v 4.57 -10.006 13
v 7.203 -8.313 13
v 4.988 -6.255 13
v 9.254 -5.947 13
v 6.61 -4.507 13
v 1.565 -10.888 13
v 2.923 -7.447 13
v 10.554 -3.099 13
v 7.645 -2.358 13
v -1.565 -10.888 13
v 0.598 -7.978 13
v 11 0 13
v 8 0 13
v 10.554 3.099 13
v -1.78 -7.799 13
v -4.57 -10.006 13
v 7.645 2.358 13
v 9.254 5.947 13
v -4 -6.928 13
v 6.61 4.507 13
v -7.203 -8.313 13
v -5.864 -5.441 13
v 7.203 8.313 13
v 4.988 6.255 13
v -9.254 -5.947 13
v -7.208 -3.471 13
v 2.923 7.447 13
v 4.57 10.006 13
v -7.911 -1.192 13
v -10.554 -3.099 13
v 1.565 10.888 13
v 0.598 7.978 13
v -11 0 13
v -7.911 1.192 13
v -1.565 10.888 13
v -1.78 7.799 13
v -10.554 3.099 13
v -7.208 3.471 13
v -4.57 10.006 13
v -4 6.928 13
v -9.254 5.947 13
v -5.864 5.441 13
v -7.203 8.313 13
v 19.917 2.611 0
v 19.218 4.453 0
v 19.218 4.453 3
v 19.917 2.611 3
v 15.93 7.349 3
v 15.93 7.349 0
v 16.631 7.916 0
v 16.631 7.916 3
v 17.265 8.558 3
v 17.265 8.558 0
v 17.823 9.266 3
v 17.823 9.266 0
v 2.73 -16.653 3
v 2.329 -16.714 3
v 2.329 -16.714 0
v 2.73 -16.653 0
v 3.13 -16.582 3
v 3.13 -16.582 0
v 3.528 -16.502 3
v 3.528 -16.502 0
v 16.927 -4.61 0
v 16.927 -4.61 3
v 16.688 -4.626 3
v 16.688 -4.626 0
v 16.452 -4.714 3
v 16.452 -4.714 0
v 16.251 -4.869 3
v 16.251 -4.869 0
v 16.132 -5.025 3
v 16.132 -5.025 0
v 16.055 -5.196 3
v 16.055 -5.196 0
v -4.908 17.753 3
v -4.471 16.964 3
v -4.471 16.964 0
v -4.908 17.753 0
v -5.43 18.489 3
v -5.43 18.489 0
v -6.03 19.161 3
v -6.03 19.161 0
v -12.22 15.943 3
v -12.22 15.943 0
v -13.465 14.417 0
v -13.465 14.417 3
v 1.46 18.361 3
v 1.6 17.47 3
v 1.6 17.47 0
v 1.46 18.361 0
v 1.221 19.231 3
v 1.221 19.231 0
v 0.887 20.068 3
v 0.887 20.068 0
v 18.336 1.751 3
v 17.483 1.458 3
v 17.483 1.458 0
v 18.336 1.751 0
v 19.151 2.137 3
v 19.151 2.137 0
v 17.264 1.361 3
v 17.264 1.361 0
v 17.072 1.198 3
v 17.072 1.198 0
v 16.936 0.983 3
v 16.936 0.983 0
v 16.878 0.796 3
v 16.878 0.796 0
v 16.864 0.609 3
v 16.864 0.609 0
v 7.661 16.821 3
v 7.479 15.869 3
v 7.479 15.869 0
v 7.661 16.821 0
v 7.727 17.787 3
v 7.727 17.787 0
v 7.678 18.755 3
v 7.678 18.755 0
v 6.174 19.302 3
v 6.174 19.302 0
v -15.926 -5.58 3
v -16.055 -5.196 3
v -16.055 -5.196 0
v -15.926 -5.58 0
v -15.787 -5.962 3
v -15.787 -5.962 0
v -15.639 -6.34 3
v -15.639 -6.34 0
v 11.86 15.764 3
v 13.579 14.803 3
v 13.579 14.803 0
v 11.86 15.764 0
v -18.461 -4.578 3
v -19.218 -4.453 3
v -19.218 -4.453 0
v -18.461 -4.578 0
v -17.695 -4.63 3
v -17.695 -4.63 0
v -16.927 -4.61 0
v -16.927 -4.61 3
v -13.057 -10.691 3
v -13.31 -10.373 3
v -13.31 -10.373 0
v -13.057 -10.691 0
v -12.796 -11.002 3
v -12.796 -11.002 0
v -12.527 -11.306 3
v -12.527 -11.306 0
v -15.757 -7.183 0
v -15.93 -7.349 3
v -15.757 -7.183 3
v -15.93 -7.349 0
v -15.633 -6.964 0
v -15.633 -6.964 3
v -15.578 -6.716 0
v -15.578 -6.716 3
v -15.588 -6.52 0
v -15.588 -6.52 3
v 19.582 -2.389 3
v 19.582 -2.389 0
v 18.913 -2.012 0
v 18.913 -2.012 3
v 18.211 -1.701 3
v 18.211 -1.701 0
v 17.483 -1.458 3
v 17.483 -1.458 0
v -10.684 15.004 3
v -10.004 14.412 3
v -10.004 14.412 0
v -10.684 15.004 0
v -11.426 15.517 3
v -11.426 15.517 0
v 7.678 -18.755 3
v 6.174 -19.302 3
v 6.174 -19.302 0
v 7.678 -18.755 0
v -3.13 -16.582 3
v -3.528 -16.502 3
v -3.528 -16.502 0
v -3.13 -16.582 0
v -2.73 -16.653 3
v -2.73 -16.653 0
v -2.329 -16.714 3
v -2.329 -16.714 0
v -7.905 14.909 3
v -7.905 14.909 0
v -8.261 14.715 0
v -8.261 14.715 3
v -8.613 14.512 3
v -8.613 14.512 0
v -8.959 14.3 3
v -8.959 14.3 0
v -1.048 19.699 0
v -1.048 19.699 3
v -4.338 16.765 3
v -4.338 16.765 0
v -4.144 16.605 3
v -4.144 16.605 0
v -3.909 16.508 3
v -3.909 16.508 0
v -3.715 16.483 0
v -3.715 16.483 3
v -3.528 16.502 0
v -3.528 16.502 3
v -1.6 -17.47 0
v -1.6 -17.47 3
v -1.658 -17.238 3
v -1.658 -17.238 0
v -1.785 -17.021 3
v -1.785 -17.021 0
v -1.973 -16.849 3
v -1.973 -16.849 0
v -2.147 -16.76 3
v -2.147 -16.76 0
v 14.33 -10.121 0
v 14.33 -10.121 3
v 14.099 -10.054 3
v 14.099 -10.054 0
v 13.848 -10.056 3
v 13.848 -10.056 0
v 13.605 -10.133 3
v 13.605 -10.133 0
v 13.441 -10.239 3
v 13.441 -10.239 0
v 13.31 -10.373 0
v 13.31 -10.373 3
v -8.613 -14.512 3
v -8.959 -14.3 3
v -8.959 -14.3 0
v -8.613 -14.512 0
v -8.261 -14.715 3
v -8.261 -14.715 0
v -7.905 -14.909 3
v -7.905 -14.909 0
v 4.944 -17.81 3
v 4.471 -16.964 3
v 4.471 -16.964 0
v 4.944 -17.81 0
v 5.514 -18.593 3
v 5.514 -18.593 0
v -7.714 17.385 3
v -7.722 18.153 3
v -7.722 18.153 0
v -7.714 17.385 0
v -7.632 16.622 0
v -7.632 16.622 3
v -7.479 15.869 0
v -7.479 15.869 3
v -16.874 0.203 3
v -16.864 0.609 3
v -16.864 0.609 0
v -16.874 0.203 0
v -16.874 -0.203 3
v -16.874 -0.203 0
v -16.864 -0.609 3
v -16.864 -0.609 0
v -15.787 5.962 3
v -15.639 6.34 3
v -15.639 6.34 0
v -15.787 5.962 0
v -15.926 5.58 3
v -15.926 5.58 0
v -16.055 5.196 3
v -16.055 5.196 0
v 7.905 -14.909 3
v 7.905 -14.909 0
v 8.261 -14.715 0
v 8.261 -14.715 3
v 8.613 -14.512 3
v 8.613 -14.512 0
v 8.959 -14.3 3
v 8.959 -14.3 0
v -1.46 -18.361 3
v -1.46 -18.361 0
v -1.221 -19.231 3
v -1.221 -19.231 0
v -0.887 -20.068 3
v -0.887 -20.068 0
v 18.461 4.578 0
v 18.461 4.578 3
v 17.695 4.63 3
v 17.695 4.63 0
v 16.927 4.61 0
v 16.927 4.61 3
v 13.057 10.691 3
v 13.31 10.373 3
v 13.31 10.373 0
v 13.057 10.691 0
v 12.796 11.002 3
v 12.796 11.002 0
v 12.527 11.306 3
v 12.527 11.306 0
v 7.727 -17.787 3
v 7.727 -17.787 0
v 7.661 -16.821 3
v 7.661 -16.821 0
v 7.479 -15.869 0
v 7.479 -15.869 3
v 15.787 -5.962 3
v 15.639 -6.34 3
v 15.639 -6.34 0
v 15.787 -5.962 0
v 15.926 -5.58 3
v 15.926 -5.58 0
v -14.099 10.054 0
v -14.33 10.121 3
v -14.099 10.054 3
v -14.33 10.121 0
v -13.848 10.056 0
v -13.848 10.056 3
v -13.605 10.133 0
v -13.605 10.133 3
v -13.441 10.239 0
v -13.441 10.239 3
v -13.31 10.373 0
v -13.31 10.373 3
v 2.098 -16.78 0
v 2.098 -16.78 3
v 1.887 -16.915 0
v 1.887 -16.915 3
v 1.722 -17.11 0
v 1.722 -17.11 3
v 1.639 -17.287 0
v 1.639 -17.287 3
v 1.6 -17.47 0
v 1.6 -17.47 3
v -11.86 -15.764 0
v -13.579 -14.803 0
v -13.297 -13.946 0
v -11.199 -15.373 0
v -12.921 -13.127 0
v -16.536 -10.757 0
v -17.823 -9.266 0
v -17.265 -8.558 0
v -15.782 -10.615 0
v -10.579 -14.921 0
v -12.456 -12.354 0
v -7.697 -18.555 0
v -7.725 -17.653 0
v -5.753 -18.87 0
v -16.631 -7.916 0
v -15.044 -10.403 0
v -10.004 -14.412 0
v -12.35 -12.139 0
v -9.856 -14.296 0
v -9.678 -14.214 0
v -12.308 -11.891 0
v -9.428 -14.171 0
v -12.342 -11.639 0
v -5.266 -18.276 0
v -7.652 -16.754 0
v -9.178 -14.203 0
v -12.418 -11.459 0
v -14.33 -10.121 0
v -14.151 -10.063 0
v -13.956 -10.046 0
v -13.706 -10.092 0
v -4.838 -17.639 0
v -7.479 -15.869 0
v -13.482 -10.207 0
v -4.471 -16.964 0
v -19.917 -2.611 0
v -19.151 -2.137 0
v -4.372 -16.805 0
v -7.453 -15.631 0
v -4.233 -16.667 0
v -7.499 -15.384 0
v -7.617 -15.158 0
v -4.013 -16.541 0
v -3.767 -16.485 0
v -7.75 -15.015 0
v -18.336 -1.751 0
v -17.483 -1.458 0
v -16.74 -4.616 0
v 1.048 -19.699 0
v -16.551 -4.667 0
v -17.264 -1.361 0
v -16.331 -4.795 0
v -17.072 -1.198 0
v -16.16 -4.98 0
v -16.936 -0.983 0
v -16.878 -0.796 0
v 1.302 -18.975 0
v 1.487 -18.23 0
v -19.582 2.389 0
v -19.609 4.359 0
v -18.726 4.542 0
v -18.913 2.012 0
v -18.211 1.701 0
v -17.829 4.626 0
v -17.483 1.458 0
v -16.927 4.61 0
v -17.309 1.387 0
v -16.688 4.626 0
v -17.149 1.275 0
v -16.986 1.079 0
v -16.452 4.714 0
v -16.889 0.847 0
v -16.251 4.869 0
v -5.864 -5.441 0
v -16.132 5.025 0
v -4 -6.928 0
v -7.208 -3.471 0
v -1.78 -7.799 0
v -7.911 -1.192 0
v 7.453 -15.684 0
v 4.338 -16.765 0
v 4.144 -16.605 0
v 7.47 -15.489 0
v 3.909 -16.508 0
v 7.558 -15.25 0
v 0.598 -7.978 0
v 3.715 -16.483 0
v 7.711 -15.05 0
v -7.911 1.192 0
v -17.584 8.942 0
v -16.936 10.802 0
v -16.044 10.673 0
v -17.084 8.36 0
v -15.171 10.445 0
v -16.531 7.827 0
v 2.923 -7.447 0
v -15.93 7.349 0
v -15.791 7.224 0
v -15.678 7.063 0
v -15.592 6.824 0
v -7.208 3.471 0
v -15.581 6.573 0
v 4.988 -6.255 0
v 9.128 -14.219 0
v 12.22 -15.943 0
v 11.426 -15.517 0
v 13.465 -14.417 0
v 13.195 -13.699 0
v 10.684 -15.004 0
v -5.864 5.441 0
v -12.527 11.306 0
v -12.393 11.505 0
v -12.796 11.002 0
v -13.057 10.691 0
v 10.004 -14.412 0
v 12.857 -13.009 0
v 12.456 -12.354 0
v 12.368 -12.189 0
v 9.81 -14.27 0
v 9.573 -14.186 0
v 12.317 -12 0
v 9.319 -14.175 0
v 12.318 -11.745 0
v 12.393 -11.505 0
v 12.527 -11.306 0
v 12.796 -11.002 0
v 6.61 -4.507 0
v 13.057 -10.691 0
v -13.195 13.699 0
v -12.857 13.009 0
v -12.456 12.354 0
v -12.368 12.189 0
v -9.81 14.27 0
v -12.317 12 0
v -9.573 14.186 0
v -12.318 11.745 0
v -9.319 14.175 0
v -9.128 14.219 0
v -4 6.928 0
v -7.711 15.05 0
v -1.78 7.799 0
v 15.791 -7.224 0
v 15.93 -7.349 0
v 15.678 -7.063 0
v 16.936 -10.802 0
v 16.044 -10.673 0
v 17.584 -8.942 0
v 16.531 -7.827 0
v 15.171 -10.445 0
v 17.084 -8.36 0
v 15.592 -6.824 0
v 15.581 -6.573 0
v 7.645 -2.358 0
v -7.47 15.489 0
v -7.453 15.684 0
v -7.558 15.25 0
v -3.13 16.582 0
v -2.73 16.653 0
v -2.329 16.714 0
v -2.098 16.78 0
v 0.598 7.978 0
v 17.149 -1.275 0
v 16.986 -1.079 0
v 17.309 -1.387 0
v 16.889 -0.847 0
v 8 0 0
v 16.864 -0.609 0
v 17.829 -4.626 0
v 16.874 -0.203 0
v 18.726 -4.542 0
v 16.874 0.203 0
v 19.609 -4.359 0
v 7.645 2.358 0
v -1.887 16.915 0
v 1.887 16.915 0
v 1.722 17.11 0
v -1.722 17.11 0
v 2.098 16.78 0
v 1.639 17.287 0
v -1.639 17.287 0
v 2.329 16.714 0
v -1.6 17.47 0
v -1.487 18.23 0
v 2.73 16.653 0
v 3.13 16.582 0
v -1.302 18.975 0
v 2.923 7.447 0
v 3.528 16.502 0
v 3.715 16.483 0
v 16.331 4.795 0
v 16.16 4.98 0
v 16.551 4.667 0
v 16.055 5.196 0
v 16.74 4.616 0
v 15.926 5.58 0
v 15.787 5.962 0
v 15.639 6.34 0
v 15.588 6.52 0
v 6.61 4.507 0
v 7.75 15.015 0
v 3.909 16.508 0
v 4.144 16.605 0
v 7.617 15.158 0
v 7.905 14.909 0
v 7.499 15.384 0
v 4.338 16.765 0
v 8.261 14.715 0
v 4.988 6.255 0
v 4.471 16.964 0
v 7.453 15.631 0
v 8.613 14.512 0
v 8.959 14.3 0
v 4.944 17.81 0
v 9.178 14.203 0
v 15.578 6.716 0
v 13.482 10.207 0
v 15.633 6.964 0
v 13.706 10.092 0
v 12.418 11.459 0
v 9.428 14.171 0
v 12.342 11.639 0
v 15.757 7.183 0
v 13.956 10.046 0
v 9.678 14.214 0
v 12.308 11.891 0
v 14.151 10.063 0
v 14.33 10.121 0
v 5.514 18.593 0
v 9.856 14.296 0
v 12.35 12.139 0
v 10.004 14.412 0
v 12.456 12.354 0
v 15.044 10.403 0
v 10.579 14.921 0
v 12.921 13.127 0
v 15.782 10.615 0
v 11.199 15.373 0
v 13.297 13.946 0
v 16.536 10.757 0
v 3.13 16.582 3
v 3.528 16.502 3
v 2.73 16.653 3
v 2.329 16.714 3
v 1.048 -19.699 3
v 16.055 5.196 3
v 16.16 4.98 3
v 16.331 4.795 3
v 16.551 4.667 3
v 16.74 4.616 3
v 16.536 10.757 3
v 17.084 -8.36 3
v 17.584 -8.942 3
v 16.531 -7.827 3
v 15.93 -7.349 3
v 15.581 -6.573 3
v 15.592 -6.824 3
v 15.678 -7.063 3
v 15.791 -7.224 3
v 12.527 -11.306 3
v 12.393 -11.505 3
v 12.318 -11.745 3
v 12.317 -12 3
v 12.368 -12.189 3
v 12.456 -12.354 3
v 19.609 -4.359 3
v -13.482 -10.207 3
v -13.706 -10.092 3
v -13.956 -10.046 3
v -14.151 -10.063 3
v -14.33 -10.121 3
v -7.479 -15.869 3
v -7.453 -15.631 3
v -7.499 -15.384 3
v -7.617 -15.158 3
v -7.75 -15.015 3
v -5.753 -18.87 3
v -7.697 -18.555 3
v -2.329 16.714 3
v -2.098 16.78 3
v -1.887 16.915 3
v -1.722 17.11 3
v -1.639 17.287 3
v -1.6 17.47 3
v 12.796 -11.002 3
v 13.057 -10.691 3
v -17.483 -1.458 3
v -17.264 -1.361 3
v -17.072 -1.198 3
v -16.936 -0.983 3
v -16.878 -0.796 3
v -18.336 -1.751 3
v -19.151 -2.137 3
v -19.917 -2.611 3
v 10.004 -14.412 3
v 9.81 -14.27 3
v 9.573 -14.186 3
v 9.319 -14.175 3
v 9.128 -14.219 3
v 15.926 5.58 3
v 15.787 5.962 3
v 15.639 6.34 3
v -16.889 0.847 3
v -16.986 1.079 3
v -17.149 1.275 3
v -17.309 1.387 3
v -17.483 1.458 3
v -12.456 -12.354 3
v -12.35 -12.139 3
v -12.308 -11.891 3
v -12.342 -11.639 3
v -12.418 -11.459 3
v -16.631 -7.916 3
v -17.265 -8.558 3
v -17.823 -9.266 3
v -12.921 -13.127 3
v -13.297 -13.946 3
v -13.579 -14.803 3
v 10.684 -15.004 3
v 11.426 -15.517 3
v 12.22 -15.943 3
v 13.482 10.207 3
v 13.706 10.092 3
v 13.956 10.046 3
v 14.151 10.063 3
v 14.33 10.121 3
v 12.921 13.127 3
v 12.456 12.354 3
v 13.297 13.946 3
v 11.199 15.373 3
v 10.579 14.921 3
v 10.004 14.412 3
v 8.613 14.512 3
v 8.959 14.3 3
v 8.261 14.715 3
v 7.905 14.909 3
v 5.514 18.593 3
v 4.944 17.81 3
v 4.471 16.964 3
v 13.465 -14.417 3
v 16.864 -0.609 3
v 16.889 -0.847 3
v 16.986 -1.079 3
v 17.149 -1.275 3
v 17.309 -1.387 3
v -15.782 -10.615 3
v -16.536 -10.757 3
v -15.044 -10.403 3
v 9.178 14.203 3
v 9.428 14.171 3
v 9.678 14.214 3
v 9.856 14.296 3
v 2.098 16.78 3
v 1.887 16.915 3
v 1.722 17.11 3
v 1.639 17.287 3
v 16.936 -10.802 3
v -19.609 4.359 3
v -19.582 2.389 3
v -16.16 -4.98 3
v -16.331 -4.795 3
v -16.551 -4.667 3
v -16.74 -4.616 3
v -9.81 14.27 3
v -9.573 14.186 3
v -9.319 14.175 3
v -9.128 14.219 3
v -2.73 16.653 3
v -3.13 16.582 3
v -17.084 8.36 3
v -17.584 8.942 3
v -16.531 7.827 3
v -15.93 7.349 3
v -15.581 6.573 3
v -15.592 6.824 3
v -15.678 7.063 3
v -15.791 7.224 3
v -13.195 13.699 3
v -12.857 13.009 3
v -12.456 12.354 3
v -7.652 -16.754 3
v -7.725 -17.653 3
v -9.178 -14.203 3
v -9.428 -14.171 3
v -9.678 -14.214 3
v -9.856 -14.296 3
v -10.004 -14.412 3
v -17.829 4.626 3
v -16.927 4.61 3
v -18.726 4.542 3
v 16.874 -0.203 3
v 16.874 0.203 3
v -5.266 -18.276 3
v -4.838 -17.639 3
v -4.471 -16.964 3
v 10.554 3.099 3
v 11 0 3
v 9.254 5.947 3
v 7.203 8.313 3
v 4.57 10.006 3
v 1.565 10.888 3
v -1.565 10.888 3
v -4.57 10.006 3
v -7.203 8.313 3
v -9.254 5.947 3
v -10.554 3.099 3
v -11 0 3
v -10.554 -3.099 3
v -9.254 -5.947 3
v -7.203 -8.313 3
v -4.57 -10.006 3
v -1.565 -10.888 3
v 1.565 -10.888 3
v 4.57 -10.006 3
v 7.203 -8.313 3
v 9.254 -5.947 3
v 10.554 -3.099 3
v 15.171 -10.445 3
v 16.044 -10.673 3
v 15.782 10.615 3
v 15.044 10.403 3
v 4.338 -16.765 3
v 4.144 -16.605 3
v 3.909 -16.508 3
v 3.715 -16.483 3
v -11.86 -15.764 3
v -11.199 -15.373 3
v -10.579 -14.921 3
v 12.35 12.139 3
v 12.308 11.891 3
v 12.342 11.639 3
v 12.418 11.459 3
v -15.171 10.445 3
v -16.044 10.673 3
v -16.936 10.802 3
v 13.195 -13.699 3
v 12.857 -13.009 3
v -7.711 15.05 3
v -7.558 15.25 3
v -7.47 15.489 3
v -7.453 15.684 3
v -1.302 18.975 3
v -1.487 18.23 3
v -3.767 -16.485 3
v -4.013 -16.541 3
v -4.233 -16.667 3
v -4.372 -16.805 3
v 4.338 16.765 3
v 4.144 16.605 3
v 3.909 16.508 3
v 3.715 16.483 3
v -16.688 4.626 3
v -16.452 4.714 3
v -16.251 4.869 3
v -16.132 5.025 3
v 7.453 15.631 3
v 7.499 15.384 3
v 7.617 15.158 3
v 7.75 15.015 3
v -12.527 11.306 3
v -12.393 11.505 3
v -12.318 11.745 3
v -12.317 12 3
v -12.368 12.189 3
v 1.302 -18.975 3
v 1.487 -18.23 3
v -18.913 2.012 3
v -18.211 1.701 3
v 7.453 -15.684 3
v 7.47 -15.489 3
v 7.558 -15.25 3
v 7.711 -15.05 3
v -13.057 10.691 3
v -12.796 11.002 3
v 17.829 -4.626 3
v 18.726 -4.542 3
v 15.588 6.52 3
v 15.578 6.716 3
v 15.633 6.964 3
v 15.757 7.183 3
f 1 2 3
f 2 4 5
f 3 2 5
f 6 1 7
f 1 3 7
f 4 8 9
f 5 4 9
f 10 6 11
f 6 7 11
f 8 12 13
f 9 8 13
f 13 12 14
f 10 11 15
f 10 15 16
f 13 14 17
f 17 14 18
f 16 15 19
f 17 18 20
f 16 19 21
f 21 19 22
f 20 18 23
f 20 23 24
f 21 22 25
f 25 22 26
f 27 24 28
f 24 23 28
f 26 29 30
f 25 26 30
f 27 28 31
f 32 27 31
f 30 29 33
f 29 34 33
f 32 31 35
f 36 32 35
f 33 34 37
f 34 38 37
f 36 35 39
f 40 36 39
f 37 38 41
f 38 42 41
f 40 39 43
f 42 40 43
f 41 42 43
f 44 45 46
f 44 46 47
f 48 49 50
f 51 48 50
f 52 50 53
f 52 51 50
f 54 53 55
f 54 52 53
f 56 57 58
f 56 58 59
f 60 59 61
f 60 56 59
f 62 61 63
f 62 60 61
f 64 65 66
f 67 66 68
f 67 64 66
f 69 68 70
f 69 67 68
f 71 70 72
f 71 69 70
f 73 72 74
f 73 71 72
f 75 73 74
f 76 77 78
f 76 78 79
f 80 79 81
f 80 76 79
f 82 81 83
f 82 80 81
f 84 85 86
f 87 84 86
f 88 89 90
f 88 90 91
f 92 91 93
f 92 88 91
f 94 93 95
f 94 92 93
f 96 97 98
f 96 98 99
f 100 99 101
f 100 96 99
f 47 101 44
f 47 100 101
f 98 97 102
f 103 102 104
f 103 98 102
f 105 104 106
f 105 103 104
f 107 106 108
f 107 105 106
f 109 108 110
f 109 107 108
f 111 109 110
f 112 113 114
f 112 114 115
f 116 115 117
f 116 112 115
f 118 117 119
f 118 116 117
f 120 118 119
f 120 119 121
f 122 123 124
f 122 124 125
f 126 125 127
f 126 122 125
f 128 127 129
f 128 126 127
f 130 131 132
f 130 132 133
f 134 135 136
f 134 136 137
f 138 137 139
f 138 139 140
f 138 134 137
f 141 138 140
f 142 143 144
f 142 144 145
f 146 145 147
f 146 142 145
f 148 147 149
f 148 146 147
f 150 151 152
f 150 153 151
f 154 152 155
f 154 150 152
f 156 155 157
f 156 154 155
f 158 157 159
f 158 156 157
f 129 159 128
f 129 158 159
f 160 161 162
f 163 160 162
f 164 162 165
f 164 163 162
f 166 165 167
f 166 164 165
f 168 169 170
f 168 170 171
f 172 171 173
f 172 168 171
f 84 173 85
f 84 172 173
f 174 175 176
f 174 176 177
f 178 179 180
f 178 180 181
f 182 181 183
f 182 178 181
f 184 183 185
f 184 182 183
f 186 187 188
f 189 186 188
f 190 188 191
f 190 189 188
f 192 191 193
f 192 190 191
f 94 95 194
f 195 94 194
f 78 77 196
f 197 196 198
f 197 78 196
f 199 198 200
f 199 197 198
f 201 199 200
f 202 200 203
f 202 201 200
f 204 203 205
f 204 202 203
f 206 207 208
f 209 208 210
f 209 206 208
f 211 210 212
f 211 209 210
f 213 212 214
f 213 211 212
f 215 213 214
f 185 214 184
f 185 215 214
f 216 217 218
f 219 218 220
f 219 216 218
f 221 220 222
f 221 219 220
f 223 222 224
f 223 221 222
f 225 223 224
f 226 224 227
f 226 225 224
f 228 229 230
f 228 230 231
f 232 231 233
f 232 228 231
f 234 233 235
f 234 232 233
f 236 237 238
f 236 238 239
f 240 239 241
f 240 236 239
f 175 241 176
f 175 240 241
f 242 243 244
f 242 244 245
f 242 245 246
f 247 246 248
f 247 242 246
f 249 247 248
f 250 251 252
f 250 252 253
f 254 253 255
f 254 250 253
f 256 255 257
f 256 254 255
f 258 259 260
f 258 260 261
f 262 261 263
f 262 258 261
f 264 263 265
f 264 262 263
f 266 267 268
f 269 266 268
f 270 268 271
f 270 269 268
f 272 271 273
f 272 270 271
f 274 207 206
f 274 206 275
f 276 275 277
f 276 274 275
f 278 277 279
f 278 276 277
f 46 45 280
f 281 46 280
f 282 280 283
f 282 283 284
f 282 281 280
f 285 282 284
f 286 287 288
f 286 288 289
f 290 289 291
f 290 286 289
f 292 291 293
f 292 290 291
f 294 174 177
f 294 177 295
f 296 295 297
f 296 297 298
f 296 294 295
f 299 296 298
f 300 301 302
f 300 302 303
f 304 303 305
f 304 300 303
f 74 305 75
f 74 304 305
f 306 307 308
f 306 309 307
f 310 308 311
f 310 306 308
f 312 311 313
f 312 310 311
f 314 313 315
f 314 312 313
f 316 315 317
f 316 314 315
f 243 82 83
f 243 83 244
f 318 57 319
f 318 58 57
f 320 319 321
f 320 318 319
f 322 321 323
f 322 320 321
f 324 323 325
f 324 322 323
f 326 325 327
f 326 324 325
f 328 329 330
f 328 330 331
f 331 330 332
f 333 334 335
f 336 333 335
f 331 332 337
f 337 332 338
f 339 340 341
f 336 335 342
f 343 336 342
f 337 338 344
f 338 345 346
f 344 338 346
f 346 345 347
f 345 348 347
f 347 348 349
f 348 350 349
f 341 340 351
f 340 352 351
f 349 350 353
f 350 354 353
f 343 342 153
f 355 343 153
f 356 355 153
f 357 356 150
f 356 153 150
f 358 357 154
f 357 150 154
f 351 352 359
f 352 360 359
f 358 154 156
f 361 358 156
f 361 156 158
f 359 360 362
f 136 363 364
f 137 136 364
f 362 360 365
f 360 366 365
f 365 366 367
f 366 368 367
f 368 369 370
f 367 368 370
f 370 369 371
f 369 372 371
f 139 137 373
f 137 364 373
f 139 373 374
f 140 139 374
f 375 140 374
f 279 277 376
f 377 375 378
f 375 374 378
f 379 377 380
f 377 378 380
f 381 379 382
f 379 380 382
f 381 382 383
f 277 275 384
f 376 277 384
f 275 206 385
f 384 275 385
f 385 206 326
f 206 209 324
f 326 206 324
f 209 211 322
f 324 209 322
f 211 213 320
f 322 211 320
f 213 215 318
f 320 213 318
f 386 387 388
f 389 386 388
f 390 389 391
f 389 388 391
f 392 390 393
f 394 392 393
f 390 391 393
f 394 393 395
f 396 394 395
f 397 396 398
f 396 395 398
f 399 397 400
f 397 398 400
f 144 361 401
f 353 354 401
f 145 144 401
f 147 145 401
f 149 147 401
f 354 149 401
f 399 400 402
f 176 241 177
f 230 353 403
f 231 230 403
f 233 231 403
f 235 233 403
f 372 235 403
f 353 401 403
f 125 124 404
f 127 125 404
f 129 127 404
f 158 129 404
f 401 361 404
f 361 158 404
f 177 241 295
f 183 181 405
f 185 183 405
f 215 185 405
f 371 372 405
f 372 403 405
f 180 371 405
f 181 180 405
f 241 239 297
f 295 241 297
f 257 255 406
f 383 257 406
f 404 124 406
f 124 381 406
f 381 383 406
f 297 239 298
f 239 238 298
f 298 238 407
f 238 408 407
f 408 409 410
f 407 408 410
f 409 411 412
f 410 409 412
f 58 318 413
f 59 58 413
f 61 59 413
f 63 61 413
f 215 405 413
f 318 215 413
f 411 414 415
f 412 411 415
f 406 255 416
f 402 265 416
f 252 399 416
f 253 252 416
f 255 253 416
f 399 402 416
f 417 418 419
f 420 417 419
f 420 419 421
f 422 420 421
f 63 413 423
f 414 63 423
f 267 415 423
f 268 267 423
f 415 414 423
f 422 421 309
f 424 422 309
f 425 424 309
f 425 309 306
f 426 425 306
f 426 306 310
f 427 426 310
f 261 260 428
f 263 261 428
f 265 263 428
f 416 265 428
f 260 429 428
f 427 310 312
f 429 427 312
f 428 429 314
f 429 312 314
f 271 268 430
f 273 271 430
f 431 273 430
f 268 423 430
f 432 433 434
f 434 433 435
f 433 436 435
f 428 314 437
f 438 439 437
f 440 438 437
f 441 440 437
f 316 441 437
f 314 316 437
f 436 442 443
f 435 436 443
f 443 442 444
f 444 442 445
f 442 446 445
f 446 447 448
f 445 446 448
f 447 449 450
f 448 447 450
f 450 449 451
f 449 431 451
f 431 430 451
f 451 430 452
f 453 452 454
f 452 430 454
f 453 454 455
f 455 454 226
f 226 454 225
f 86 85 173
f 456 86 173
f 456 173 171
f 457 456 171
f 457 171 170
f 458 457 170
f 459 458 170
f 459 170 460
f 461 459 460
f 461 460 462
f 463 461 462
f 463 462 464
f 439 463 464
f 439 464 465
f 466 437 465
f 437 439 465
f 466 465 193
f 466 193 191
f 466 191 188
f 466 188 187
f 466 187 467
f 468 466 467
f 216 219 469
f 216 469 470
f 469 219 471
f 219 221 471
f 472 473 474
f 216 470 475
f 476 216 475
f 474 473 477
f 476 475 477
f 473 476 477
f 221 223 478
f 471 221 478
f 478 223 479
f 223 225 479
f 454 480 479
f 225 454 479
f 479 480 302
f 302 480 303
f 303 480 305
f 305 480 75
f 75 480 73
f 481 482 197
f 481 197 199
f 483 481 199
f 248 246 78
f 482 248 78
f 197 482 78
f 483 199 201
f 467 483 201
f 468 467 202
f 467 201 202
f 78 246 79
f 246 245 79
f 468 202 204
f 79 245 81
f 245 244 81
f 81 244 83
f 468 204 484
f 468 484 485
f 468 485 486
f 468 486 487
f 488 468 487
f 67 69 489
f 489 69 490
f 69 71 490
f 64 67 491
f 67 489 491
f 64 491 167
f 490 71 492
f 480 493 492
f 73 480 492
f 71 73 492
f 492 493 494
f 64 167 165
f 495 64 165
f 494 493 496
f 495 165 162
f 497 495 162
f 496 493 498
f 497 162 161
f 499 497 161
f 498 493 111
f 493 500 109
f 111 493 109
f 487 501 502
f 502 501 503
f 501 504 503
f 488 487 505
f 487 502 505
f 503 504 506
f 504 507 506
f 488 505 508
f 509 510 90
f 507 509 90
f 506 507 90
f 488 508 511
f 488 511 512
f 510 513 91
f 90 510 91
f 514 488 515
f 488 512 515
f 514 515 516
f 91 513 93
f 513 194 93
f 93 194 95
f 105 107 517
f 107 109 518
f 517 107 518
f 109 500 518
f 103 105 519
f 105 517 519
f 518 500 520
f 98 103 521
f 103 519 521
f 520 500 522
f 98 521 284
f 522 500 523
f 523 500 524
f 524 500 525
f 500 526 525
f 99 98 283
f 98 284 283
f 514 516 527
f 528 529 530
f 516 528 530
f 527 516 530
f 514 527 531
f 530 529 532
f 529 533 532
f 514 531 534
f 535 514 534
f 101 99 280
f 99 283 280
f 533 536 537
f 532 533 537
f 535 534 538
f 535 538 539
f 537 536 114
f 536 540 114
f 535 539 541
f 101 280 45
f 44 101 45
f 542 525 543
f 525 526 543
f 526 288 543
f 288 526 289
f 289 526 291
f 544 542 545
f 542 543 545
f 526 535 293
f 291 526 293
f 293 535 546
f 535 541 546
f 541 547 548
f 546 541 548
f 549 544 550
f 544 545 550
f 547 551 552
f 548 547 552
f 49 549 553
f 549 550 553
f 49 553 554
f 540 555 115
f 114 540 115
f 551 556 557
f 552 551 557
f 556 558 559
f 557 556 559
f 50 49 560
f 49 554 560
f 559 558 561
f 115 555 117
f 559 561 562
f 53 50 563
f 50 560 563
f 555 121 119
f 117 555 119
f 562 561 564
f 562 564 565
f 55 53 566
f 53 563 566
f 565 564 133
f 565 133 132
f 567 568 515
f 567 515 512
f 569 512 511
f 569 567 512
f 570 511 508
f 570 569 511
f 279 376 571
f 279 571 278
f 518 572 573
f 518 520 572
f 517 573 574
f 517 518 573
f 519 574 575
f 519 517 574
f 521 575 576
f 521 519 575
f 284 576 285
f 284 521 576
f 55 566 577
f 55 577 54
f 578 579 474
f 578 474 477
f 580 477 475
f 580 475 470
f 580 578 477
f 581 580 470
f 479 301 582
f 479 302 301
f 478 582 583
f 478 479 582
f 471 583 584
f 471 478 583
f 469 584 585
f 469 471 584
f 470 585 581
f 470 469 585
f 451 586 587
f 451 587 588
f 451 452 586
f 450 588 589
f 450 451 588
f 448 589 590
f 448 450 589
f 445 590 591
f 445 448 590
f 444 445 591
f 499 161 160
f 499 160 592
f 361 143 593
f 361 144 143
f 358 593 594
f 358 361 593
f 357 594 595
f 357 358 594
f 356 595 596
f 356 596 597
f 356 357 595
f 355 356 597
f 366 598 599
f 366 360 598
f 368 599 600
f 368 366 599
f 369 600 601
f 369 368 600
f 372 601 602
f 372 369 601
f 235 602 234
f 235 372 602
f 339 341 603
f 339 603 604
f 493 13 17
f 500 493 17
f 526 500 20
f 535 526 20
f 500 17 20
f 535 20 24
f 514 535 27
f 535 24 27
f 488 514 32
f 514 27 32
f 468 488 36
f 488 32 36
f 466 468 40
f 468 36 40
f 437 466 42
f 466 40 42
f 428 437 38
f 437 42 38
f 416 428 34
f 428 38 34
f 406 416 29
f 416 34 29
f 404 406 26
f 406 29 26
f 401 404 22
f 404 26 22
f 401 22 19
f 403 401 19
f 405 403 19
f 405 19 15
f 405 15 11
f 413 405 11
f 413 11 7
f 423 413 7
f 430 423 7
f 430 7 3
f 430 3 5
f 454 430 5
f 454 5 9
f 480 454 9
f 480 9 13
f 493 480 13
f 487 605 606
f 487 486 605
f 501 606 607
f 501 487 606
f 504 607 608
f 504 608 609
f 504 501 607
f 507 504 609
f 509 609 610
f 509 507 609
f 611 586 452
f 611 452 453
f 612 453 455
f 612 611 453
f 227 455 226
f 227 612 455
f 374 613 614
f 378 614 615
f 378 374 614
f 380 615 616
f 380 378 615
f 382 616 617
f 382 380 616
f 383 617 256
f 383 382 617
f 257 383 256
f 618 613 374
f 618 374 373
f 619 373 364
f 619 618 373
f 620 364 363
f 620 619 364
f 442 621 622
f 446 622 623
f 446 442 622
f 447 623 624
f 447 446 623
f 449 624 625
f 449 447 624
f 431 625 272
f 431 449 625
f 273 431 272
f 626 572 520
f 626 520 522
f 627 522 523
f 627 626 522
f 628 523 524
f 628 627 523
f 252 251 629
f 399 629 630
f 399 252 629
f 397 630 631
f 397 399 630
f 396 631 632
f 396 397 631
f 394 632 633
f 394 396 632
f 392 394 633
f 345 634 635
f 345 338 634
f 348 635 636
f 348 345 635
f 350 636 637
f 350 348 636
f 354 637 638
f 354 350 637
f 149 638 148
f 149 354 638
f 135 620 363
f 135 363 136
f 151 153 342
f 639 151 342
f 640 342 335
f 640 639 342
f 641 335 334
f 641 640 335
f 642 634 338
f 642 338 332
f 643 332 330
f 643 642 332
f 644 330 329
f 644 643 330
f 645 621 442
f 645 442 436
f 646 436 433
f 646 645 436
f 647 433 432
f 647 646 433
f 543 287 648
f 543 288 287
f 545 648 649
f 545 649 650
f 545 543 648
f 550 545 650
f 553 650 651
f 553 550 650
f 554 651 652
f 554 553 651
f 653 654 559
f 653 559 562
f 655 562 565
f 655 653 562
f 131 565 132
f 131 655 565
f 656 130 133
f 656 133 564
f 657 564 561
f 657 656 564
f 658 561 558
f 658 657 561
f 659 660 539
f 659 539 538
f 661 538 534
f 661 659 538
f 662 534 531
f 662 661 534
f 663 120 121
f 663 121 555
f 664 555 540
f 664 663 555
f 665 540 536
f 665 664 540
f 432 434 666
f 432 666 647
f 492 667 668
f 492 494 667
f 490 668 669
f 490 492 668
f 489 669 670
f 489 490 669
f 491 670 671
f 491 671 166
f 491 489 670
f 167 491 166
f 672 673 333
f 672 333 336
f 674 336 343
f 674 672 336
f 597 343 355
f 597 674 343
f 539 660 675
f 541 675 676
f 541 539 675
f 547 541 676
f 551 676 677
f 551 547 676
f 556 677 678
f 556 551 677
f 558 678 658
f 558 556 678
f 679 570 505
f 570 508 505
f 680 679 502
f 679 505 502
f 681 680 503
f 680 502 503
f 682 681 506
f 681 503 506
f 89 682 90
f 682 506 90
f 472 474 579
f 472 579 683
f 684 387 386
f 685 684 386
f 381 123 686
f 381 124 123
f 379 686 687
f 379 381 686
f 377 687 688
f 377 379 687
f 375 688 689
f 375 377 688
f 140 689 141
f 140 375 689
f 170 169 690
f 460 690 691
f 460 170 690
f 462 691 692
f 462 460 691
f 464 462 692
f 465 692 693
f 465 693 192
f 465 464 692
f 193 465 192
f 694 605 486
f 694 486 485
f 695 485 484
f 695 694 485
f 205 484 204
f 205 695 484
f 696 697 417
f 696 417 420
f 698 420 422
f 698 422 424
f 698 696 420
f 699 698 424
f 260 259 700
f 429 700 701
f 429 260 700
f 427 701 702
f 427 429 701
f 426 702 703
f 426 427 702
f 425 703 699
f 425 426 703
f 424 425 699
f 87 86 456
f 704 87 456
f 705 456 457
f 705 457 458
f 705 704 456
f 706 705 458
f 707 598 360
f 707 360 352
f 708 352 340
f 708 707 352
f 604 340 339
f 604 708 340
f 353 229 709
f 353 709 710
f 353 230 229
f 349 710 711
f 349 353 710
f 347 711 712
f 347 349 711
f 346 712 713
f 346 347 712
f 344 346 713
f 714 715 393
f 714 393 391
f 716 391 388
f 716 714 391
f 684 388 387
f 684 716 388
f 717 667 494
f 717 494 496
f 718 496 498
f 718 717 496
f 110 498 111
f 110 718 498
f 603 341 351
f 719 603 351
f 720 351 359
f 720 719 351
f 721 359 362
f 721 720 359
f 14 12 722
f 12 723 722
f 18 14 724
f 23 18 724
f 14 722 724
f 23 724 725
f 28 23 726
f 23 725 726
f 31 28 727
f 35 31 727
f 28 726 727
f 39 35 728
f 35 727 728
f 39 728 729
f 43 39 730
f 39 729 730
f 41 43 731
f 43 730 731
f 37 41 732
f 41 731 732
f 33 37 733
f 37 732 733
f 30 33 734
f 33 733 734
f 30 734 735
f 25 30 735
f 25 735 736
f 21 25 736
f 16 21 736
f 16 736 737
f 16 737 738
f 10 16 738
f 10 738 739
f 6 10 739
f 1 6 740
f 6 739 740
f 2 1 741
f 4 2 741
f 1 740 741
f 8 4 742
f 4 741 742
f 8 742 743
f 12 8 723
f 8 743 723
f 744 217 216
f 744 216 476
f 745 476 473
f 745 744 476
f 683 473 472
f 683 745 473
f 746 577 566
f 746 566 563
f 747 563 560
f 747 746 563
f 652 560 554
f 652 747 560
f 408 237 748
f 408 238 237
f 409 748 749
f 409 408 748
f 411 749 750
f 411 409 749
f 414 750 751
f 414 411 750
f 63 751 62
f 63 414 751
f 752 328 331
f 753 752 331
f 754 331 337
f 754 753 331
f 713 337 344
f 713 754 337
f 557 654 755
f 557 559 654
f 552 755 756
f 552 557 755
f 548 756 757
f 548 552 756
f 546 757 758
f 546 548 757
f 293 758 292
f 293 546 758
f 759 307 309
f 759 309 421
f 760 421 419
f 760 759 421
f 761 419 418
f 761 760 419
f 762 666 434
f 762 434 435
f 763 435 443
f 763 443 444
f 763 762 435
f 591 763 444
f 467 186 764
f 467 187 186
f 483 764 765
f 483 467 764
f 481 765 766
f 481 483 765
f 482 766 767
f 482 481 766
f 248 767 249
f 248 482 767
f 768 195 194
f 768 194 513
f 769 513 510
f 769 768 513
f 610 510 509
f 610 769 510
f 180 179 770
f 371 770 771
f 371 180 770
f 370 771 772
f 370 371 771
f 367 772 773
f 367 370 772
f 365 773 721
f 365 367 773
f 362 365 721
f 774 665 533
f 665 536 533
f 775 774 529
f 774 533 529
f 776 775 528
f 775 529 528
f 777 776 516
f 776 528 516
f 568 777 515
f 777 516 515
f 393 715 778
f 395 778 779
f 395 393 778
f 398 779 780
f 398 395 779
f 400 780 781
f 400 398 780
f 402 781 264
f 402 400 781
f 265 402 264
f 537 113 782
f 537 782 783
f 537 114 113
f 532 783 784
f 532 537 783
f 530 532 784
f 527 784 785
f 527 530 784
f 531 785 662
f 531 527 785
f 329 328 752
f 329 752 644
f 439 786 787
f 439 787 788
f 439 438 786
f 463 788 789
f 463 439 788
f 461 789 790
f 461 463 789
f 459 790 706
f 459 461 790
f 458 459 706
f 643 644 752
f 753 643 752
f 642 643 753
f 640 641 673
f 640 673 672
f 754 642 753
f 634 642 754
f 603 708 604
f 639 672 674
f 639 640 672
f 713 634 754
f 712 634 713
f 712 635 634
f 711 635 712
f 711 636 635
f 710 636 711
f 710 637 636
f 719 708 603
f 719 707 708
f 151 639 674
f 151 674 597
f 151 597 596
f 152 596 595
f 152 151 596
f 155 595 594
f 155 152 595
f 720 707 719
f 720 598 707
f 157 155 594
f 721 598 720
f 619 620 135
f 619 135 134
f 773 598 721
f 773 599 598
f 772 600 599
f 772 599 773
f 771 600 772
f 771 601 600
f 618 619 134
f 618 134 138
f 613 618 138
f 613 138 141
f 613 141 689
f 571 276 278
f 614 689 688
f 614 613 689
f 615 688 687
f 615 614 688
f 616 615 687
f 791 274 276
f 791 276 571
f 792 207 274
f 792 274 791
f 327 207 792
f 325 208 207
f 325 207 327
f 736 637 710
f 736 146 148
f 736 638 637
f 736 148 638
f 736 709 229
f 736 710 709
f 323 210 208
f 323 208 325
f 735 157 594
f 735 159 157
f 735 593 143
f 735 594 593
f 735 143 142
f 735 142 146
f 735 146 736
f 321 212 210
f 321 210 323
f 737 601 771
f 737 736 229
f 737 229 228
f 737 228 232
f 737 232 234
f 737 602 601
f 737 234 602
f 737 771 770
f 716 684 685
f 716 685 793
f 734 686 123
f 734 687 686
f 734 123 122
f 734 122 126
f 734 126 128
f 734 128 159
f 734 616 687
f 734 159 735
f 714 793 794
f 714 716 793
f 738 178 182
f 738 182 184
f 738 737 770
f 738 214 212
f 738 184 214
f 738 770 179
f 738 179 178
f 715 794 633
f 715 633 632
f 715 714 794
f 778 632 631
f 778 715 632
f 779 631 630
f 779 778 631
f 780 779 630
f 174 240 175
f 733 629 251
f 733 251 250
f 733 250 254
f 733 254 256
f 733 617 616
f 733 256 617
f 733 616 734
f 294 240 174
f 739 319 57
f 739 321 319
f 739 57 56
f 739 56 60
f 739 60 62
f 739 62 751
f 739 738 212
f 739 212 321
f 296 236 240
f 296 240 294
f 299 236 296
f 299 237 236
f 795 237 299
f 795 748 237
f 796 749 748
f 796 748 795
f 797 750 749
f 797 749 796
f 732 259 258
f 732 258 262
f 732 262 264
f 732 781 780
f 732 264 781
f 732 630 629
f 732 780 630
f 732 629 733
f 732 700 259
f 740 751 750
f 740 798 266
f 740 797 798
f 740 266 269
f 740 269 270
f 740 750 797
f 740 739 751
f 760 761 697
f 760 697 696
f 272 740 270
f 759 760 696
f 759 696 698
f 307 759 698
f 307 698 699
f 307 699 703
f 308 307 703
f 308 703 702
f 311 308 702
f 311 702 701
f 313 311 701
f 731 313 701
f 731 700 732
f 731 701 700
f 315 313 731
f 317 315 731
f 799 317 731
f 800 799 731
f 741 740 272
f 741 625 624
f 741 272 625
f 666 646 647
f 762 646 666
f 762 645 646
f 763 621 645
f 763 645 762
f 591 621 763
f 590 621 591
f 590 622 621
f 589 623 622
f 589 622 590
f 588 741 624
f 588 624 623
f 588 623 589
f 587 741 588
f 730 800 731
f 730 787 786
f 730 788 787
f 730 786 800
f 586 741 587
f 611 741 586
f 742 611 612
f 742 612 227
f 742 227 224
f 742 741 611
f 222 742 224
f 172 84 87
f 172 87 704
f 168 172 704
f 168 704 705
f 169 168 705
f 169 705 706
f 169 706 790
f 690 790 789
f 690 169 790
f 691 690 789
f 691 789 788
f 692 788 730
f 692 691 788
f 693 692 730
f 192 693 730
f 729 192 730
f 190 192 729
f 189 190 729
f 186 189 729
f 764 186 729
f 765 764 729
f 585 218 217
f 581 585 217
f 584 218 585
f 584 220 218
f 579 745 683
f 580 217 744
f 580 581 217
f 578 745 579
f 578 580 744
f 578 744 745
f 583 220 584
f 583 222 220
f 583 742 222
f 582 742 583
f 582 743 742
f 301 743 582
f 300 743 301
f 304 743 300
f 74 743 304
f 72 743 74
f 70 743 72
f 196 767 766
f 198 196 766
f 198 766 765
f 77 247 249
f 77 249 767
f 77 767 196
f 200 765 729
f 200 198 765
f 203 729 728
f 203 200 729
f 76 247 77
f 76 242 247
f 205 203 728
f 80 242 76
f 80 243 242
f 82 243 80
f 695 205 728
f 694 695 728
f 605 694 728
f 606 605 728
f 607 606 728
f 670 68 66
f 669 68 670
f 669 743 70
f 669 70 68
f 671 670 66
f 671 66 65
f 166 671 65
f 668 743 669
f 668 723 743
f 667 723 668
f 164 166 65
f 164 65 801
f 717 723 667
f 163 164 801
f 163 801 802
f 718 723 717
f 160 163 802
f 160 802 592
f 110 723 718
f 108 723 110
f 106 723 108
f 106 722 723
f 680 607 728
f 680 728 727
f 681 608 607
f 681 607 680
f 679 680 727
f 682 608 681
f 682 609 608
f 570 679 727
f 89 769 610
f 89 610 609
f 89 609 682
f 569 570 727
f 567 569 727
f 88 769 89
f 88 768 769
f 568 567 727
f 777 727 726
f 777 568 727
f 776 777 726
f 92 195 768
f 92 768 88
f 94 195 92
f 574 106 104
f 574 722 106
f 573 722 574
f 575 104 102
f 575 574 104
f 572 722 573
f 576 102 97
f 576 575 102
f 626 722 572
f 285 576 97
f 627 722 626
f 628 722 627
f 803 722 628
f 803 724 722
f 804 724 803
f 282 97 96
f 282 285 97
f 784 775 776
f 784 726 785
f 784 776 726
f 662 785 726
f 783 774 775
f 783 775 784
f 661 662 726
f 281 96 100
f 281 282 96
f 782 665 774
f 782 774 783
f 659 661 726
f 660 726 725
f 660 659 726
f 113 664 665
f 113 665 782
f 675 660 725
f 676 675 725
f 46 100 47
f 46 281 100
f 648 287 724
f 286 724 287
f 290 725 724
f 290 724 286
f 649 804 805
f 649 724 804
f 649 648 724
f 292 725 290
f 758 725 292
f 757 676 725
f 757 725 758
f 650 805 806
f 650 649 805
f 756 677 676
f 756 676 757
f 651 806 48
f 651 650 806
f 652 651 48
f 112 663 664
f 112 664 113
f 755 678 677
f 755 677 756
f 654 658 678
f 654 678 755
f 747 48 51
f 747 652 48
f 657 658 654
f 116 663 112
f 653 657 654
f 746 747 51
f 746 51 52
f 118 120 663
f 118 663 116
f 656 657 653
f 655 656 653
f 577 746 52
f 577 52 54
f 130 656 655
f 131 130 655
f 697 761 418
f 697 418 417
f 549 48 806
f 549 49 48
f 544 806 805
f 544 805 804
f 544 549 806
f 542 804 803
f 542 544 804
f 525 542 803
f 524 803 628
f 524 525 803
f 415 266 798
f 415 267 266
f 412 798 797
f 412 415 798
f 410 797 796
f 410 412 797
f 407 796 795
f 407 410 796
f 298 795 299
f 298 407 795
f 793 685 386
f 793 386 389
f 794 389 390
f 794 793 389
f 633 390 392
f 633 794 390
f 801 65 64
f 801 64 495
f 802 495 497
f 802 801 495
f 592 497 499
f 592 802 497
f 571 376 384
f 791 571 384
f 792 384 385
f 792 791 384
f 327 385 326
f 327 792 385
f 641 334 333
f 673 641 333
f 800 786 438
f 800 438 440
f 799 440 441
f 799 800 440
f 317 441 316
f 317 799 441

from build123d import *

# Parameters (mm, degrees)
EXTRUDE_1_DEPTH         = 3
SKETCH_2_W              = 11
SKETCH_2_H              = 10
HOLE_WIZARD_16_0_16_1_D = 16
FILLET_1_R              = 0.85


with BuildPart() as part:
    # 草图1 → 凸台-拉伸1 (new body)
    with BuildSketch(Plane.XY.offset(3)):
        with BuildLine():
            Line((7.677617845, 18.755038144), (6.174109651, 19.302270373))
            ThreePointArc((6.174109651, 19.302270373), (5.023989627, 17.932407977), (4.203345275, 16.343118231))
            ThreePointArc((4.203345275, 16.343118231), (2.930312998, 16.618630832), (1.639823102, 16.795136355))
            ThreePointArc((1.639823102, 16.795136355), (1.197968963, 19.299137818), (0, 21.541932676))
            ThreePointArc((0, 21.541932676), (-1.197968963, 19.299137818), (-1.639823102, 16.795136355))
            ThreePointArc((-1.639823102, 16.795136355), (-2.930312998, 16.618630832), (-4.203345275, 16.343118231))
            ThreePointArc((-4.203345275, 16.343118231), (-5.474971289, 18.544986912), (-7.367774901, 20.242795173))
            ThreePointArc((-7.367774901, 20.242795173), (-7.726416477, 17.725527879), (-7.285204612, 15.221413166))
            ThreePointArc((-7.285204612, 15.221413166), (-8.4375, 14.614178689), (-9.539528177, 13.919878849))
            ThreePointArc((-9.539528177, 13.919878849), (-11.4875492, 15.554036889), (-13.846887413, 16.50207782))
            ThreePointArc((-13.846887413, 16.50207782), (-13.322944134, 14.013957677), (-12.051882927, 11.811762904))
            ThreePointArc((-12.051882927, 11.811762904), (-12.926999978, 10.847040913), (-13.725103193, 9.817696642))
            ThreePointArc((-13.725103193, 9.817696642), (-16.114559141, 10.687040464), (-18.655860944, 10.770966338))
            ThreePointArc((-18.655860944, 10.770966338), (-17.312528103, 8.612097355), (-15.364926295, 6.977439714))
            ThreePointArc((-15.364926295, 6.977439714), (-15.857312976, 5.771589919), (-16.255228202, 4.531355326))
            ThreePointArc((-16.255228202, 4.531355326), (-18.797915423, 4.531029235), (-21.214662314, 3.740717353))
            ThreePointArc((-21.214662314, 3.740717353), (-19.213965677, 2.17149099), (-16.824732789, 1.301534317))
            ThreePointArc((-16.824732789, 1.301534317), (-16.875, 0), (-16.824732789, -1.301534317))
            ThreePointArc((-16.824732789, -1.301534317), (-19.213965677, -2.17149099), (-21.214662314, -3.740717353))
            ThreePointArc((-21.214662314, -3.740717353), (-18.797915423, -4.531029235), (-16.255228202, -4.531355326))
            ThreePointArc((-16.255228202, -4.531355326), (-15.857312976, -5.771589919), (-15.364926295, -6.977439714))
            ThreePointArc((-15.364926295, -6.977439714), (-17.312528103, -8.612097355), (-18.655860944, -10.770966338))
            ThreePointArc((-18.655860944, -10.770966338), (-16.114559141, -10.687040464), (-13.725103193, -9.817696642))
            ThreePointArc((-13.725103193, -9.817696642), (-12.926999978, -10.847040913), (-12.051882927, -11.811762904))
            ThreePointArc((-12.051882927, -11.811762904), (-13.322944134, -14.013957677), (-13.846887413, -16.50207782))
            ThreePointArc((-13.846887413, -16.50207782), (-11.4875492, -15.554036889), (-9.539528177, -13.919878849))
            ThreePointArc((-9.539528177, -13.919878849), (-8.4375, -14.614178689), (-7.285204612, -15.221413166))
            ThreePointArc((-7.285204612, -15.221413166), (-7.726416477, -17.725527879), (-7.367774901, -20.242795173))
            ThreePointArc((-7.367774901, -20.242795173), (-5.474971289, -18.544986912), (-4.203345275, -16.343118231))
            ThreePointArc((-4.203345275, -16.343118231), (-2.930312998, -16.618630832), (-1.639823102, -16.795136355))
            ThreePointArc((-1.639823102, -16.795136355), (-1.197968963, -19.299137818), (0, -21.541932676))
            ThreePointArc((0, -21.541932676), (1.197968963, -19.299137818), (1.639823102, -16.795136355))
            ThreePointArc((1.639823102, -16.795136355), (2.930312998, -16.618630832), (4.203345275, -16.343118231))
            ThreePointArc((4.203345275, -16.343118231), (5.023989627, -17.932407977), (6.174109651, -19.302270373))
            Line((6.174109651, -19.302270373), (7.677617845, -18.755038144))
            ThreePointArc((7.677617845, -18.755038144), (7.678130324, -16.966379766), (7.285204612, -15.221413166))
            ThreePointArc((7.285204612, -15.221413166), (8.4375, -14.614178689), (9.539528177, -13.919878849))
            ThreePointArc((9.539528177, -13.919878849), (11.4875492, -15.554036889), (13.846887413, -16.50207782))
            ThreePointArc((13.846887413, -16.50207782), (13.322944134, -14.013957677), (12.051882927, -11.811762904))
            ThreePointArc((12.051882927, -11.811762904), (12.926999978, -10.847040913), (13.725103193, -9.817696642))
            ThreePointArc((13.725103193, -9.817696642), (16.114559141, -10.687040464), (18.655860944, -10.770966338))
            ThreePointArc((18.655860944, -10.770966338), (17.312528103, -8.612097355), (15.364926295, -6.977439714))
            ThreePointArc((15.364926295, -6.977439714), (15.857312976, -5.771589919), (16.255228202, -4.531355326))
            ThreePointArc((16.255228202, -4.531355326), (18.797915423, -4.531029235), (21.214662314, -3.740717353))
            ThreePointArc((21.214662314, -3.740717353), (19.213965677, -2.17149099), (16.824732789, -1.301534317))
            ThreePointArc((16.824732789, -1.301534317), (16.875, 0), (16.824732789, 1.301534317))
            ThreePointArc((16.824732789, 1.301534317), (19.213965677, 2.17149099), (21.214662314, 3.740717353))
            ThreePointArc((21.214662314, 3.740717353), (18.797915423, 4.531029235), (16.255228202, 4.531355326))
            ThreePointArc((16.255228202, 4.531355326), (15.857312976, 5.771589919), (15.364926295, 6.977439714))
            ThreePointArc((15.364926295, 6.977439714), (17.312528103, 8.612097355), (18.655860944, 10.770966338))
            ThreePointArc((18.655860944, 10.770966338), (16.114559141, 10.687040464), (13.725103193, 9.817696642))
            ThreePointArc((13.725103193, 9.817696642), (12.926999978, 10.847040913), (12.051882927, 11.811762904))
            ThreePointArc((12.051882927, 11.811762904), (13.322944134, 14.013957677), (13.846887413, 16.50207782))
            ThreePointArc((13.846887413, 16.50207782), (11.4875492, 15.554036889), (9.539528177, 13.919878849))
            ThreePointArc((9.539528177, 13.919878849), (8.4375, 14.614178689), (7.285204612, 15.221413166))
            ThreePointArc((7.285204612, 15.221413166), (7.678130324, 16.966379766), (7.677617845, 18.755038144))
        make_face()
    extrude(amount=-EXTRUDE_1_DEPTH)

    # 草图2 → 旋转1 (revolve)
    with BuildSketch(Plane(origin=(0, 0, 0), x_dir=(1, 0, 0), z_dir=(0, 1, 0))):
        with Locations((5.5, -8)):
            Rectangle(SKETCH_2_W, SKETCH_2_H)
    revolve(axis=Axis((0, 0, 3), (0, 0, 1)))

    # Ø16.0 (16) 直径孔1 (through all)
    with Locations(Plane(origin=(0, 0, 0), x_dir=(-1, 0, 0), z_dir=(0, 0, -1))):
        with Locations((0, 0)):
            Hole(HOLE_WIZARD_16_0_16_1_D / 2)

    # 倒角1
    # the kernel refuses this chamfer: 2.4092894, 1.801151222 mm, written as the material it takes off along each edge
    with BuildSketch(Plane(origin=(21.214662314, 3.740717353, 8.457999089), x_dir=(-0.9419139002762257, 0.33585443940259097, 0), z_dir=(0, 0, -1)), Plane(origin=(21.214662314, -3.740717353, 8.457999089), x_dir=(-0.7702405580042077, 0.6377534655377162, 0), z_dir=(0, 0, -1)), Plane(origin=(18.655860944, -10.770966338, 8.457999089), x_dir=(-0.5056648368969275, 0.8627300114902714, 0), z_dir=(0, 0, -1)), Plane(origin=(13.846887413, -16.50207782, 8.457999089), x_dir=(-0.18009847364168569, 0.9836485855181895, 0), z_dir=(0, 0, -1)), Plane(origin=(0, -21.541932676, 8.457999089), x_dir=(0.4943136881093548, 0.8692836002983879, 0), z_dir=(0, 0, -1)), Plane(origin=(-7.367774901, -20.242795173, 8.457999089), x_dir=(0.7618154266345339, 0.6477941461156027, 0), z_dir=(0, 0, -1)), Plane(origin=(-13.846887413, -16.50207782, 8.457999089), x_dir=(0.9374309815093264, 0.3481711574878957, 0), z_dir=(0, 0, -1)), Plane(origin=(18.655860944, 10.770966338, 8.457999089), x_dir=(-0.9999785250062793, -0.00655358880811246, 0), z_dir=(0, 0, -1))) as chamfer_1_piece_1:
        with BuildLine():
            Line((2.119488029, 0), (0.84248532, -1.499732591))
            ThreePointArc((0.84248532, -1.499732591), (0.389416714, -0.786885265), (0, 0))
            ThreePointArc((0, 0), (1.091111326, 0.069719636), (2.119488029, 0))
        make_face()
    extrude(amount=13.915998179, mode=Mode.SUBTRACT)
    with BuildSketch(Plane(origin=(-18.655860944, -10.770966338, 8.457999089), x_dir=(0.48404481309239716, 0.8750432097435796, 0), z_dir=(0, 0, -1)), Plane(origin=(-21.214662314, -3.740717353, 8.457999089), x_dir=(0.7541357430052743, 0.6567185707149471, 0), z_dir=(0, 0, -1)), Plane(origin=(-21.214662314, 3.740717353, 8.457999089), x_dir=(0.9332667724535083, 0.35918397992423245, 0), z_dir=(0, 0, -1)), Plane(origin=(-18.655860944, 10.770966338, 8.457999089), x_dir=(0.9998320555932133, 0.01832650016368515, 0), z_dir=(0, 0, -1)), Plane(origin=(-13.846887413, 16.50207782, 8.457999089), x_dir=(0.9458028368787899, -0.32474142598694317, 0), z_dir=(0, 0, -1)), Plane(origin=(-7.367774901, 20.242795173, 8.457999089), x_dir=(0.777695837473541, -0.6286407434905311, 0), z_dir=(0, 0, -1)), Plane(origin=(0, 21.541932676, 8.457999089), x_dir=(0.5157872425008245, -0.8567167095798913, 0), z_dir=(0, 0, -1)), Plane(origin=(13.846887413, 16.50207782, 8.457999089), x_dir=(-0.15557093497995983, -0.9878247234147671, 0), z_dir=(0, 0, -1))) as chamfer_1_piece_2:
        with BuildLine():
            Line((1.72016841, 0), (1.038059727, 1.847880275))
            ThreePointArc((1.038059727, 1.847880275), (0.473607386, 0.985434319), (0, 0))
            ThreePointArc((0, 0), (0.87677191, -0.045878267), (1.72016841, 0))
        make_face()
    extrude(amount=13.915998179, mode=Mode.SUBTRACT)

    # 圆角1
    fillet_1_edges = [part.edges().sort_by_distance(p)[0] for p in [
        (16.824732789, 1.301534317, 1.5),
        (16.824732789, -1.301534317, 1.5),
        (16.255228202, -4.531355326, 1.5),
        (15.364926295, -6.977439714, 1.5),
        (13.725103193, -9.817696642, 1.5),
        (12.051882927, -11.811762904, 1.5),
        (9.539528177, -13.919878849, 1.5),
        (7.285204612, -15.221413166, 1.5),
        (4.203345275, -16.343118231, 1.5),
        (1.639823102, -16.795136355, 1.5),
        (-1.639823102, -16.795136355, 1.5),
        (-4.203345275, -16.343118231, 1.5),
        (-7.285204612, -15.221413166, 1.5),
        (-9.539528177, -13.919878849, 1.5),
        (-12.051882927, -11.811762904, 1.5),
        (-13.725103193, -9.817696642, 1.5),
        (-15.364926295, -6.977439714, 1.5),
        (-16.255228202, -4.531355326, 1.5),
        (-16.824732789, -1.301534317, 1.5),
        (-16.824732789, 1.301534317, 1.5),
        (-16.255228202, 4.531355326, 1.5),
        (-15.364926295, 6.977439714, 1.5),
        (-13.725103193, 9.817696642, 1.5),
        (-12.051882927, 11.811762904, 1.5),
        (-9.539528177, 13.919878849, 1.5),
        (-7.285204612, 15.221413166, 1.5),
        (-4.203345275, 16.343118231, 1.5),
        (-1.639823102, 16.795136355, 1.5),
        (1.639823102, 16.795136355, 1.5),
        (4.203345275, 16.343118231, 1.5),
        (7.285204612, 15.221413166, 1.5),
        (9.539528177, 13.919878849, 1.5),
        (12.051882927, 11.811762904, 1.5),
        (13.725103193, 9.817696642, 1.5),
        (15.364926295, 6.977439714, 1.5),
        (16.255228202, 4.531355326, 1.5),
    ]]
    fillet(fillet_1_edges, radius=FILLET_1_R)


solid = part.part
